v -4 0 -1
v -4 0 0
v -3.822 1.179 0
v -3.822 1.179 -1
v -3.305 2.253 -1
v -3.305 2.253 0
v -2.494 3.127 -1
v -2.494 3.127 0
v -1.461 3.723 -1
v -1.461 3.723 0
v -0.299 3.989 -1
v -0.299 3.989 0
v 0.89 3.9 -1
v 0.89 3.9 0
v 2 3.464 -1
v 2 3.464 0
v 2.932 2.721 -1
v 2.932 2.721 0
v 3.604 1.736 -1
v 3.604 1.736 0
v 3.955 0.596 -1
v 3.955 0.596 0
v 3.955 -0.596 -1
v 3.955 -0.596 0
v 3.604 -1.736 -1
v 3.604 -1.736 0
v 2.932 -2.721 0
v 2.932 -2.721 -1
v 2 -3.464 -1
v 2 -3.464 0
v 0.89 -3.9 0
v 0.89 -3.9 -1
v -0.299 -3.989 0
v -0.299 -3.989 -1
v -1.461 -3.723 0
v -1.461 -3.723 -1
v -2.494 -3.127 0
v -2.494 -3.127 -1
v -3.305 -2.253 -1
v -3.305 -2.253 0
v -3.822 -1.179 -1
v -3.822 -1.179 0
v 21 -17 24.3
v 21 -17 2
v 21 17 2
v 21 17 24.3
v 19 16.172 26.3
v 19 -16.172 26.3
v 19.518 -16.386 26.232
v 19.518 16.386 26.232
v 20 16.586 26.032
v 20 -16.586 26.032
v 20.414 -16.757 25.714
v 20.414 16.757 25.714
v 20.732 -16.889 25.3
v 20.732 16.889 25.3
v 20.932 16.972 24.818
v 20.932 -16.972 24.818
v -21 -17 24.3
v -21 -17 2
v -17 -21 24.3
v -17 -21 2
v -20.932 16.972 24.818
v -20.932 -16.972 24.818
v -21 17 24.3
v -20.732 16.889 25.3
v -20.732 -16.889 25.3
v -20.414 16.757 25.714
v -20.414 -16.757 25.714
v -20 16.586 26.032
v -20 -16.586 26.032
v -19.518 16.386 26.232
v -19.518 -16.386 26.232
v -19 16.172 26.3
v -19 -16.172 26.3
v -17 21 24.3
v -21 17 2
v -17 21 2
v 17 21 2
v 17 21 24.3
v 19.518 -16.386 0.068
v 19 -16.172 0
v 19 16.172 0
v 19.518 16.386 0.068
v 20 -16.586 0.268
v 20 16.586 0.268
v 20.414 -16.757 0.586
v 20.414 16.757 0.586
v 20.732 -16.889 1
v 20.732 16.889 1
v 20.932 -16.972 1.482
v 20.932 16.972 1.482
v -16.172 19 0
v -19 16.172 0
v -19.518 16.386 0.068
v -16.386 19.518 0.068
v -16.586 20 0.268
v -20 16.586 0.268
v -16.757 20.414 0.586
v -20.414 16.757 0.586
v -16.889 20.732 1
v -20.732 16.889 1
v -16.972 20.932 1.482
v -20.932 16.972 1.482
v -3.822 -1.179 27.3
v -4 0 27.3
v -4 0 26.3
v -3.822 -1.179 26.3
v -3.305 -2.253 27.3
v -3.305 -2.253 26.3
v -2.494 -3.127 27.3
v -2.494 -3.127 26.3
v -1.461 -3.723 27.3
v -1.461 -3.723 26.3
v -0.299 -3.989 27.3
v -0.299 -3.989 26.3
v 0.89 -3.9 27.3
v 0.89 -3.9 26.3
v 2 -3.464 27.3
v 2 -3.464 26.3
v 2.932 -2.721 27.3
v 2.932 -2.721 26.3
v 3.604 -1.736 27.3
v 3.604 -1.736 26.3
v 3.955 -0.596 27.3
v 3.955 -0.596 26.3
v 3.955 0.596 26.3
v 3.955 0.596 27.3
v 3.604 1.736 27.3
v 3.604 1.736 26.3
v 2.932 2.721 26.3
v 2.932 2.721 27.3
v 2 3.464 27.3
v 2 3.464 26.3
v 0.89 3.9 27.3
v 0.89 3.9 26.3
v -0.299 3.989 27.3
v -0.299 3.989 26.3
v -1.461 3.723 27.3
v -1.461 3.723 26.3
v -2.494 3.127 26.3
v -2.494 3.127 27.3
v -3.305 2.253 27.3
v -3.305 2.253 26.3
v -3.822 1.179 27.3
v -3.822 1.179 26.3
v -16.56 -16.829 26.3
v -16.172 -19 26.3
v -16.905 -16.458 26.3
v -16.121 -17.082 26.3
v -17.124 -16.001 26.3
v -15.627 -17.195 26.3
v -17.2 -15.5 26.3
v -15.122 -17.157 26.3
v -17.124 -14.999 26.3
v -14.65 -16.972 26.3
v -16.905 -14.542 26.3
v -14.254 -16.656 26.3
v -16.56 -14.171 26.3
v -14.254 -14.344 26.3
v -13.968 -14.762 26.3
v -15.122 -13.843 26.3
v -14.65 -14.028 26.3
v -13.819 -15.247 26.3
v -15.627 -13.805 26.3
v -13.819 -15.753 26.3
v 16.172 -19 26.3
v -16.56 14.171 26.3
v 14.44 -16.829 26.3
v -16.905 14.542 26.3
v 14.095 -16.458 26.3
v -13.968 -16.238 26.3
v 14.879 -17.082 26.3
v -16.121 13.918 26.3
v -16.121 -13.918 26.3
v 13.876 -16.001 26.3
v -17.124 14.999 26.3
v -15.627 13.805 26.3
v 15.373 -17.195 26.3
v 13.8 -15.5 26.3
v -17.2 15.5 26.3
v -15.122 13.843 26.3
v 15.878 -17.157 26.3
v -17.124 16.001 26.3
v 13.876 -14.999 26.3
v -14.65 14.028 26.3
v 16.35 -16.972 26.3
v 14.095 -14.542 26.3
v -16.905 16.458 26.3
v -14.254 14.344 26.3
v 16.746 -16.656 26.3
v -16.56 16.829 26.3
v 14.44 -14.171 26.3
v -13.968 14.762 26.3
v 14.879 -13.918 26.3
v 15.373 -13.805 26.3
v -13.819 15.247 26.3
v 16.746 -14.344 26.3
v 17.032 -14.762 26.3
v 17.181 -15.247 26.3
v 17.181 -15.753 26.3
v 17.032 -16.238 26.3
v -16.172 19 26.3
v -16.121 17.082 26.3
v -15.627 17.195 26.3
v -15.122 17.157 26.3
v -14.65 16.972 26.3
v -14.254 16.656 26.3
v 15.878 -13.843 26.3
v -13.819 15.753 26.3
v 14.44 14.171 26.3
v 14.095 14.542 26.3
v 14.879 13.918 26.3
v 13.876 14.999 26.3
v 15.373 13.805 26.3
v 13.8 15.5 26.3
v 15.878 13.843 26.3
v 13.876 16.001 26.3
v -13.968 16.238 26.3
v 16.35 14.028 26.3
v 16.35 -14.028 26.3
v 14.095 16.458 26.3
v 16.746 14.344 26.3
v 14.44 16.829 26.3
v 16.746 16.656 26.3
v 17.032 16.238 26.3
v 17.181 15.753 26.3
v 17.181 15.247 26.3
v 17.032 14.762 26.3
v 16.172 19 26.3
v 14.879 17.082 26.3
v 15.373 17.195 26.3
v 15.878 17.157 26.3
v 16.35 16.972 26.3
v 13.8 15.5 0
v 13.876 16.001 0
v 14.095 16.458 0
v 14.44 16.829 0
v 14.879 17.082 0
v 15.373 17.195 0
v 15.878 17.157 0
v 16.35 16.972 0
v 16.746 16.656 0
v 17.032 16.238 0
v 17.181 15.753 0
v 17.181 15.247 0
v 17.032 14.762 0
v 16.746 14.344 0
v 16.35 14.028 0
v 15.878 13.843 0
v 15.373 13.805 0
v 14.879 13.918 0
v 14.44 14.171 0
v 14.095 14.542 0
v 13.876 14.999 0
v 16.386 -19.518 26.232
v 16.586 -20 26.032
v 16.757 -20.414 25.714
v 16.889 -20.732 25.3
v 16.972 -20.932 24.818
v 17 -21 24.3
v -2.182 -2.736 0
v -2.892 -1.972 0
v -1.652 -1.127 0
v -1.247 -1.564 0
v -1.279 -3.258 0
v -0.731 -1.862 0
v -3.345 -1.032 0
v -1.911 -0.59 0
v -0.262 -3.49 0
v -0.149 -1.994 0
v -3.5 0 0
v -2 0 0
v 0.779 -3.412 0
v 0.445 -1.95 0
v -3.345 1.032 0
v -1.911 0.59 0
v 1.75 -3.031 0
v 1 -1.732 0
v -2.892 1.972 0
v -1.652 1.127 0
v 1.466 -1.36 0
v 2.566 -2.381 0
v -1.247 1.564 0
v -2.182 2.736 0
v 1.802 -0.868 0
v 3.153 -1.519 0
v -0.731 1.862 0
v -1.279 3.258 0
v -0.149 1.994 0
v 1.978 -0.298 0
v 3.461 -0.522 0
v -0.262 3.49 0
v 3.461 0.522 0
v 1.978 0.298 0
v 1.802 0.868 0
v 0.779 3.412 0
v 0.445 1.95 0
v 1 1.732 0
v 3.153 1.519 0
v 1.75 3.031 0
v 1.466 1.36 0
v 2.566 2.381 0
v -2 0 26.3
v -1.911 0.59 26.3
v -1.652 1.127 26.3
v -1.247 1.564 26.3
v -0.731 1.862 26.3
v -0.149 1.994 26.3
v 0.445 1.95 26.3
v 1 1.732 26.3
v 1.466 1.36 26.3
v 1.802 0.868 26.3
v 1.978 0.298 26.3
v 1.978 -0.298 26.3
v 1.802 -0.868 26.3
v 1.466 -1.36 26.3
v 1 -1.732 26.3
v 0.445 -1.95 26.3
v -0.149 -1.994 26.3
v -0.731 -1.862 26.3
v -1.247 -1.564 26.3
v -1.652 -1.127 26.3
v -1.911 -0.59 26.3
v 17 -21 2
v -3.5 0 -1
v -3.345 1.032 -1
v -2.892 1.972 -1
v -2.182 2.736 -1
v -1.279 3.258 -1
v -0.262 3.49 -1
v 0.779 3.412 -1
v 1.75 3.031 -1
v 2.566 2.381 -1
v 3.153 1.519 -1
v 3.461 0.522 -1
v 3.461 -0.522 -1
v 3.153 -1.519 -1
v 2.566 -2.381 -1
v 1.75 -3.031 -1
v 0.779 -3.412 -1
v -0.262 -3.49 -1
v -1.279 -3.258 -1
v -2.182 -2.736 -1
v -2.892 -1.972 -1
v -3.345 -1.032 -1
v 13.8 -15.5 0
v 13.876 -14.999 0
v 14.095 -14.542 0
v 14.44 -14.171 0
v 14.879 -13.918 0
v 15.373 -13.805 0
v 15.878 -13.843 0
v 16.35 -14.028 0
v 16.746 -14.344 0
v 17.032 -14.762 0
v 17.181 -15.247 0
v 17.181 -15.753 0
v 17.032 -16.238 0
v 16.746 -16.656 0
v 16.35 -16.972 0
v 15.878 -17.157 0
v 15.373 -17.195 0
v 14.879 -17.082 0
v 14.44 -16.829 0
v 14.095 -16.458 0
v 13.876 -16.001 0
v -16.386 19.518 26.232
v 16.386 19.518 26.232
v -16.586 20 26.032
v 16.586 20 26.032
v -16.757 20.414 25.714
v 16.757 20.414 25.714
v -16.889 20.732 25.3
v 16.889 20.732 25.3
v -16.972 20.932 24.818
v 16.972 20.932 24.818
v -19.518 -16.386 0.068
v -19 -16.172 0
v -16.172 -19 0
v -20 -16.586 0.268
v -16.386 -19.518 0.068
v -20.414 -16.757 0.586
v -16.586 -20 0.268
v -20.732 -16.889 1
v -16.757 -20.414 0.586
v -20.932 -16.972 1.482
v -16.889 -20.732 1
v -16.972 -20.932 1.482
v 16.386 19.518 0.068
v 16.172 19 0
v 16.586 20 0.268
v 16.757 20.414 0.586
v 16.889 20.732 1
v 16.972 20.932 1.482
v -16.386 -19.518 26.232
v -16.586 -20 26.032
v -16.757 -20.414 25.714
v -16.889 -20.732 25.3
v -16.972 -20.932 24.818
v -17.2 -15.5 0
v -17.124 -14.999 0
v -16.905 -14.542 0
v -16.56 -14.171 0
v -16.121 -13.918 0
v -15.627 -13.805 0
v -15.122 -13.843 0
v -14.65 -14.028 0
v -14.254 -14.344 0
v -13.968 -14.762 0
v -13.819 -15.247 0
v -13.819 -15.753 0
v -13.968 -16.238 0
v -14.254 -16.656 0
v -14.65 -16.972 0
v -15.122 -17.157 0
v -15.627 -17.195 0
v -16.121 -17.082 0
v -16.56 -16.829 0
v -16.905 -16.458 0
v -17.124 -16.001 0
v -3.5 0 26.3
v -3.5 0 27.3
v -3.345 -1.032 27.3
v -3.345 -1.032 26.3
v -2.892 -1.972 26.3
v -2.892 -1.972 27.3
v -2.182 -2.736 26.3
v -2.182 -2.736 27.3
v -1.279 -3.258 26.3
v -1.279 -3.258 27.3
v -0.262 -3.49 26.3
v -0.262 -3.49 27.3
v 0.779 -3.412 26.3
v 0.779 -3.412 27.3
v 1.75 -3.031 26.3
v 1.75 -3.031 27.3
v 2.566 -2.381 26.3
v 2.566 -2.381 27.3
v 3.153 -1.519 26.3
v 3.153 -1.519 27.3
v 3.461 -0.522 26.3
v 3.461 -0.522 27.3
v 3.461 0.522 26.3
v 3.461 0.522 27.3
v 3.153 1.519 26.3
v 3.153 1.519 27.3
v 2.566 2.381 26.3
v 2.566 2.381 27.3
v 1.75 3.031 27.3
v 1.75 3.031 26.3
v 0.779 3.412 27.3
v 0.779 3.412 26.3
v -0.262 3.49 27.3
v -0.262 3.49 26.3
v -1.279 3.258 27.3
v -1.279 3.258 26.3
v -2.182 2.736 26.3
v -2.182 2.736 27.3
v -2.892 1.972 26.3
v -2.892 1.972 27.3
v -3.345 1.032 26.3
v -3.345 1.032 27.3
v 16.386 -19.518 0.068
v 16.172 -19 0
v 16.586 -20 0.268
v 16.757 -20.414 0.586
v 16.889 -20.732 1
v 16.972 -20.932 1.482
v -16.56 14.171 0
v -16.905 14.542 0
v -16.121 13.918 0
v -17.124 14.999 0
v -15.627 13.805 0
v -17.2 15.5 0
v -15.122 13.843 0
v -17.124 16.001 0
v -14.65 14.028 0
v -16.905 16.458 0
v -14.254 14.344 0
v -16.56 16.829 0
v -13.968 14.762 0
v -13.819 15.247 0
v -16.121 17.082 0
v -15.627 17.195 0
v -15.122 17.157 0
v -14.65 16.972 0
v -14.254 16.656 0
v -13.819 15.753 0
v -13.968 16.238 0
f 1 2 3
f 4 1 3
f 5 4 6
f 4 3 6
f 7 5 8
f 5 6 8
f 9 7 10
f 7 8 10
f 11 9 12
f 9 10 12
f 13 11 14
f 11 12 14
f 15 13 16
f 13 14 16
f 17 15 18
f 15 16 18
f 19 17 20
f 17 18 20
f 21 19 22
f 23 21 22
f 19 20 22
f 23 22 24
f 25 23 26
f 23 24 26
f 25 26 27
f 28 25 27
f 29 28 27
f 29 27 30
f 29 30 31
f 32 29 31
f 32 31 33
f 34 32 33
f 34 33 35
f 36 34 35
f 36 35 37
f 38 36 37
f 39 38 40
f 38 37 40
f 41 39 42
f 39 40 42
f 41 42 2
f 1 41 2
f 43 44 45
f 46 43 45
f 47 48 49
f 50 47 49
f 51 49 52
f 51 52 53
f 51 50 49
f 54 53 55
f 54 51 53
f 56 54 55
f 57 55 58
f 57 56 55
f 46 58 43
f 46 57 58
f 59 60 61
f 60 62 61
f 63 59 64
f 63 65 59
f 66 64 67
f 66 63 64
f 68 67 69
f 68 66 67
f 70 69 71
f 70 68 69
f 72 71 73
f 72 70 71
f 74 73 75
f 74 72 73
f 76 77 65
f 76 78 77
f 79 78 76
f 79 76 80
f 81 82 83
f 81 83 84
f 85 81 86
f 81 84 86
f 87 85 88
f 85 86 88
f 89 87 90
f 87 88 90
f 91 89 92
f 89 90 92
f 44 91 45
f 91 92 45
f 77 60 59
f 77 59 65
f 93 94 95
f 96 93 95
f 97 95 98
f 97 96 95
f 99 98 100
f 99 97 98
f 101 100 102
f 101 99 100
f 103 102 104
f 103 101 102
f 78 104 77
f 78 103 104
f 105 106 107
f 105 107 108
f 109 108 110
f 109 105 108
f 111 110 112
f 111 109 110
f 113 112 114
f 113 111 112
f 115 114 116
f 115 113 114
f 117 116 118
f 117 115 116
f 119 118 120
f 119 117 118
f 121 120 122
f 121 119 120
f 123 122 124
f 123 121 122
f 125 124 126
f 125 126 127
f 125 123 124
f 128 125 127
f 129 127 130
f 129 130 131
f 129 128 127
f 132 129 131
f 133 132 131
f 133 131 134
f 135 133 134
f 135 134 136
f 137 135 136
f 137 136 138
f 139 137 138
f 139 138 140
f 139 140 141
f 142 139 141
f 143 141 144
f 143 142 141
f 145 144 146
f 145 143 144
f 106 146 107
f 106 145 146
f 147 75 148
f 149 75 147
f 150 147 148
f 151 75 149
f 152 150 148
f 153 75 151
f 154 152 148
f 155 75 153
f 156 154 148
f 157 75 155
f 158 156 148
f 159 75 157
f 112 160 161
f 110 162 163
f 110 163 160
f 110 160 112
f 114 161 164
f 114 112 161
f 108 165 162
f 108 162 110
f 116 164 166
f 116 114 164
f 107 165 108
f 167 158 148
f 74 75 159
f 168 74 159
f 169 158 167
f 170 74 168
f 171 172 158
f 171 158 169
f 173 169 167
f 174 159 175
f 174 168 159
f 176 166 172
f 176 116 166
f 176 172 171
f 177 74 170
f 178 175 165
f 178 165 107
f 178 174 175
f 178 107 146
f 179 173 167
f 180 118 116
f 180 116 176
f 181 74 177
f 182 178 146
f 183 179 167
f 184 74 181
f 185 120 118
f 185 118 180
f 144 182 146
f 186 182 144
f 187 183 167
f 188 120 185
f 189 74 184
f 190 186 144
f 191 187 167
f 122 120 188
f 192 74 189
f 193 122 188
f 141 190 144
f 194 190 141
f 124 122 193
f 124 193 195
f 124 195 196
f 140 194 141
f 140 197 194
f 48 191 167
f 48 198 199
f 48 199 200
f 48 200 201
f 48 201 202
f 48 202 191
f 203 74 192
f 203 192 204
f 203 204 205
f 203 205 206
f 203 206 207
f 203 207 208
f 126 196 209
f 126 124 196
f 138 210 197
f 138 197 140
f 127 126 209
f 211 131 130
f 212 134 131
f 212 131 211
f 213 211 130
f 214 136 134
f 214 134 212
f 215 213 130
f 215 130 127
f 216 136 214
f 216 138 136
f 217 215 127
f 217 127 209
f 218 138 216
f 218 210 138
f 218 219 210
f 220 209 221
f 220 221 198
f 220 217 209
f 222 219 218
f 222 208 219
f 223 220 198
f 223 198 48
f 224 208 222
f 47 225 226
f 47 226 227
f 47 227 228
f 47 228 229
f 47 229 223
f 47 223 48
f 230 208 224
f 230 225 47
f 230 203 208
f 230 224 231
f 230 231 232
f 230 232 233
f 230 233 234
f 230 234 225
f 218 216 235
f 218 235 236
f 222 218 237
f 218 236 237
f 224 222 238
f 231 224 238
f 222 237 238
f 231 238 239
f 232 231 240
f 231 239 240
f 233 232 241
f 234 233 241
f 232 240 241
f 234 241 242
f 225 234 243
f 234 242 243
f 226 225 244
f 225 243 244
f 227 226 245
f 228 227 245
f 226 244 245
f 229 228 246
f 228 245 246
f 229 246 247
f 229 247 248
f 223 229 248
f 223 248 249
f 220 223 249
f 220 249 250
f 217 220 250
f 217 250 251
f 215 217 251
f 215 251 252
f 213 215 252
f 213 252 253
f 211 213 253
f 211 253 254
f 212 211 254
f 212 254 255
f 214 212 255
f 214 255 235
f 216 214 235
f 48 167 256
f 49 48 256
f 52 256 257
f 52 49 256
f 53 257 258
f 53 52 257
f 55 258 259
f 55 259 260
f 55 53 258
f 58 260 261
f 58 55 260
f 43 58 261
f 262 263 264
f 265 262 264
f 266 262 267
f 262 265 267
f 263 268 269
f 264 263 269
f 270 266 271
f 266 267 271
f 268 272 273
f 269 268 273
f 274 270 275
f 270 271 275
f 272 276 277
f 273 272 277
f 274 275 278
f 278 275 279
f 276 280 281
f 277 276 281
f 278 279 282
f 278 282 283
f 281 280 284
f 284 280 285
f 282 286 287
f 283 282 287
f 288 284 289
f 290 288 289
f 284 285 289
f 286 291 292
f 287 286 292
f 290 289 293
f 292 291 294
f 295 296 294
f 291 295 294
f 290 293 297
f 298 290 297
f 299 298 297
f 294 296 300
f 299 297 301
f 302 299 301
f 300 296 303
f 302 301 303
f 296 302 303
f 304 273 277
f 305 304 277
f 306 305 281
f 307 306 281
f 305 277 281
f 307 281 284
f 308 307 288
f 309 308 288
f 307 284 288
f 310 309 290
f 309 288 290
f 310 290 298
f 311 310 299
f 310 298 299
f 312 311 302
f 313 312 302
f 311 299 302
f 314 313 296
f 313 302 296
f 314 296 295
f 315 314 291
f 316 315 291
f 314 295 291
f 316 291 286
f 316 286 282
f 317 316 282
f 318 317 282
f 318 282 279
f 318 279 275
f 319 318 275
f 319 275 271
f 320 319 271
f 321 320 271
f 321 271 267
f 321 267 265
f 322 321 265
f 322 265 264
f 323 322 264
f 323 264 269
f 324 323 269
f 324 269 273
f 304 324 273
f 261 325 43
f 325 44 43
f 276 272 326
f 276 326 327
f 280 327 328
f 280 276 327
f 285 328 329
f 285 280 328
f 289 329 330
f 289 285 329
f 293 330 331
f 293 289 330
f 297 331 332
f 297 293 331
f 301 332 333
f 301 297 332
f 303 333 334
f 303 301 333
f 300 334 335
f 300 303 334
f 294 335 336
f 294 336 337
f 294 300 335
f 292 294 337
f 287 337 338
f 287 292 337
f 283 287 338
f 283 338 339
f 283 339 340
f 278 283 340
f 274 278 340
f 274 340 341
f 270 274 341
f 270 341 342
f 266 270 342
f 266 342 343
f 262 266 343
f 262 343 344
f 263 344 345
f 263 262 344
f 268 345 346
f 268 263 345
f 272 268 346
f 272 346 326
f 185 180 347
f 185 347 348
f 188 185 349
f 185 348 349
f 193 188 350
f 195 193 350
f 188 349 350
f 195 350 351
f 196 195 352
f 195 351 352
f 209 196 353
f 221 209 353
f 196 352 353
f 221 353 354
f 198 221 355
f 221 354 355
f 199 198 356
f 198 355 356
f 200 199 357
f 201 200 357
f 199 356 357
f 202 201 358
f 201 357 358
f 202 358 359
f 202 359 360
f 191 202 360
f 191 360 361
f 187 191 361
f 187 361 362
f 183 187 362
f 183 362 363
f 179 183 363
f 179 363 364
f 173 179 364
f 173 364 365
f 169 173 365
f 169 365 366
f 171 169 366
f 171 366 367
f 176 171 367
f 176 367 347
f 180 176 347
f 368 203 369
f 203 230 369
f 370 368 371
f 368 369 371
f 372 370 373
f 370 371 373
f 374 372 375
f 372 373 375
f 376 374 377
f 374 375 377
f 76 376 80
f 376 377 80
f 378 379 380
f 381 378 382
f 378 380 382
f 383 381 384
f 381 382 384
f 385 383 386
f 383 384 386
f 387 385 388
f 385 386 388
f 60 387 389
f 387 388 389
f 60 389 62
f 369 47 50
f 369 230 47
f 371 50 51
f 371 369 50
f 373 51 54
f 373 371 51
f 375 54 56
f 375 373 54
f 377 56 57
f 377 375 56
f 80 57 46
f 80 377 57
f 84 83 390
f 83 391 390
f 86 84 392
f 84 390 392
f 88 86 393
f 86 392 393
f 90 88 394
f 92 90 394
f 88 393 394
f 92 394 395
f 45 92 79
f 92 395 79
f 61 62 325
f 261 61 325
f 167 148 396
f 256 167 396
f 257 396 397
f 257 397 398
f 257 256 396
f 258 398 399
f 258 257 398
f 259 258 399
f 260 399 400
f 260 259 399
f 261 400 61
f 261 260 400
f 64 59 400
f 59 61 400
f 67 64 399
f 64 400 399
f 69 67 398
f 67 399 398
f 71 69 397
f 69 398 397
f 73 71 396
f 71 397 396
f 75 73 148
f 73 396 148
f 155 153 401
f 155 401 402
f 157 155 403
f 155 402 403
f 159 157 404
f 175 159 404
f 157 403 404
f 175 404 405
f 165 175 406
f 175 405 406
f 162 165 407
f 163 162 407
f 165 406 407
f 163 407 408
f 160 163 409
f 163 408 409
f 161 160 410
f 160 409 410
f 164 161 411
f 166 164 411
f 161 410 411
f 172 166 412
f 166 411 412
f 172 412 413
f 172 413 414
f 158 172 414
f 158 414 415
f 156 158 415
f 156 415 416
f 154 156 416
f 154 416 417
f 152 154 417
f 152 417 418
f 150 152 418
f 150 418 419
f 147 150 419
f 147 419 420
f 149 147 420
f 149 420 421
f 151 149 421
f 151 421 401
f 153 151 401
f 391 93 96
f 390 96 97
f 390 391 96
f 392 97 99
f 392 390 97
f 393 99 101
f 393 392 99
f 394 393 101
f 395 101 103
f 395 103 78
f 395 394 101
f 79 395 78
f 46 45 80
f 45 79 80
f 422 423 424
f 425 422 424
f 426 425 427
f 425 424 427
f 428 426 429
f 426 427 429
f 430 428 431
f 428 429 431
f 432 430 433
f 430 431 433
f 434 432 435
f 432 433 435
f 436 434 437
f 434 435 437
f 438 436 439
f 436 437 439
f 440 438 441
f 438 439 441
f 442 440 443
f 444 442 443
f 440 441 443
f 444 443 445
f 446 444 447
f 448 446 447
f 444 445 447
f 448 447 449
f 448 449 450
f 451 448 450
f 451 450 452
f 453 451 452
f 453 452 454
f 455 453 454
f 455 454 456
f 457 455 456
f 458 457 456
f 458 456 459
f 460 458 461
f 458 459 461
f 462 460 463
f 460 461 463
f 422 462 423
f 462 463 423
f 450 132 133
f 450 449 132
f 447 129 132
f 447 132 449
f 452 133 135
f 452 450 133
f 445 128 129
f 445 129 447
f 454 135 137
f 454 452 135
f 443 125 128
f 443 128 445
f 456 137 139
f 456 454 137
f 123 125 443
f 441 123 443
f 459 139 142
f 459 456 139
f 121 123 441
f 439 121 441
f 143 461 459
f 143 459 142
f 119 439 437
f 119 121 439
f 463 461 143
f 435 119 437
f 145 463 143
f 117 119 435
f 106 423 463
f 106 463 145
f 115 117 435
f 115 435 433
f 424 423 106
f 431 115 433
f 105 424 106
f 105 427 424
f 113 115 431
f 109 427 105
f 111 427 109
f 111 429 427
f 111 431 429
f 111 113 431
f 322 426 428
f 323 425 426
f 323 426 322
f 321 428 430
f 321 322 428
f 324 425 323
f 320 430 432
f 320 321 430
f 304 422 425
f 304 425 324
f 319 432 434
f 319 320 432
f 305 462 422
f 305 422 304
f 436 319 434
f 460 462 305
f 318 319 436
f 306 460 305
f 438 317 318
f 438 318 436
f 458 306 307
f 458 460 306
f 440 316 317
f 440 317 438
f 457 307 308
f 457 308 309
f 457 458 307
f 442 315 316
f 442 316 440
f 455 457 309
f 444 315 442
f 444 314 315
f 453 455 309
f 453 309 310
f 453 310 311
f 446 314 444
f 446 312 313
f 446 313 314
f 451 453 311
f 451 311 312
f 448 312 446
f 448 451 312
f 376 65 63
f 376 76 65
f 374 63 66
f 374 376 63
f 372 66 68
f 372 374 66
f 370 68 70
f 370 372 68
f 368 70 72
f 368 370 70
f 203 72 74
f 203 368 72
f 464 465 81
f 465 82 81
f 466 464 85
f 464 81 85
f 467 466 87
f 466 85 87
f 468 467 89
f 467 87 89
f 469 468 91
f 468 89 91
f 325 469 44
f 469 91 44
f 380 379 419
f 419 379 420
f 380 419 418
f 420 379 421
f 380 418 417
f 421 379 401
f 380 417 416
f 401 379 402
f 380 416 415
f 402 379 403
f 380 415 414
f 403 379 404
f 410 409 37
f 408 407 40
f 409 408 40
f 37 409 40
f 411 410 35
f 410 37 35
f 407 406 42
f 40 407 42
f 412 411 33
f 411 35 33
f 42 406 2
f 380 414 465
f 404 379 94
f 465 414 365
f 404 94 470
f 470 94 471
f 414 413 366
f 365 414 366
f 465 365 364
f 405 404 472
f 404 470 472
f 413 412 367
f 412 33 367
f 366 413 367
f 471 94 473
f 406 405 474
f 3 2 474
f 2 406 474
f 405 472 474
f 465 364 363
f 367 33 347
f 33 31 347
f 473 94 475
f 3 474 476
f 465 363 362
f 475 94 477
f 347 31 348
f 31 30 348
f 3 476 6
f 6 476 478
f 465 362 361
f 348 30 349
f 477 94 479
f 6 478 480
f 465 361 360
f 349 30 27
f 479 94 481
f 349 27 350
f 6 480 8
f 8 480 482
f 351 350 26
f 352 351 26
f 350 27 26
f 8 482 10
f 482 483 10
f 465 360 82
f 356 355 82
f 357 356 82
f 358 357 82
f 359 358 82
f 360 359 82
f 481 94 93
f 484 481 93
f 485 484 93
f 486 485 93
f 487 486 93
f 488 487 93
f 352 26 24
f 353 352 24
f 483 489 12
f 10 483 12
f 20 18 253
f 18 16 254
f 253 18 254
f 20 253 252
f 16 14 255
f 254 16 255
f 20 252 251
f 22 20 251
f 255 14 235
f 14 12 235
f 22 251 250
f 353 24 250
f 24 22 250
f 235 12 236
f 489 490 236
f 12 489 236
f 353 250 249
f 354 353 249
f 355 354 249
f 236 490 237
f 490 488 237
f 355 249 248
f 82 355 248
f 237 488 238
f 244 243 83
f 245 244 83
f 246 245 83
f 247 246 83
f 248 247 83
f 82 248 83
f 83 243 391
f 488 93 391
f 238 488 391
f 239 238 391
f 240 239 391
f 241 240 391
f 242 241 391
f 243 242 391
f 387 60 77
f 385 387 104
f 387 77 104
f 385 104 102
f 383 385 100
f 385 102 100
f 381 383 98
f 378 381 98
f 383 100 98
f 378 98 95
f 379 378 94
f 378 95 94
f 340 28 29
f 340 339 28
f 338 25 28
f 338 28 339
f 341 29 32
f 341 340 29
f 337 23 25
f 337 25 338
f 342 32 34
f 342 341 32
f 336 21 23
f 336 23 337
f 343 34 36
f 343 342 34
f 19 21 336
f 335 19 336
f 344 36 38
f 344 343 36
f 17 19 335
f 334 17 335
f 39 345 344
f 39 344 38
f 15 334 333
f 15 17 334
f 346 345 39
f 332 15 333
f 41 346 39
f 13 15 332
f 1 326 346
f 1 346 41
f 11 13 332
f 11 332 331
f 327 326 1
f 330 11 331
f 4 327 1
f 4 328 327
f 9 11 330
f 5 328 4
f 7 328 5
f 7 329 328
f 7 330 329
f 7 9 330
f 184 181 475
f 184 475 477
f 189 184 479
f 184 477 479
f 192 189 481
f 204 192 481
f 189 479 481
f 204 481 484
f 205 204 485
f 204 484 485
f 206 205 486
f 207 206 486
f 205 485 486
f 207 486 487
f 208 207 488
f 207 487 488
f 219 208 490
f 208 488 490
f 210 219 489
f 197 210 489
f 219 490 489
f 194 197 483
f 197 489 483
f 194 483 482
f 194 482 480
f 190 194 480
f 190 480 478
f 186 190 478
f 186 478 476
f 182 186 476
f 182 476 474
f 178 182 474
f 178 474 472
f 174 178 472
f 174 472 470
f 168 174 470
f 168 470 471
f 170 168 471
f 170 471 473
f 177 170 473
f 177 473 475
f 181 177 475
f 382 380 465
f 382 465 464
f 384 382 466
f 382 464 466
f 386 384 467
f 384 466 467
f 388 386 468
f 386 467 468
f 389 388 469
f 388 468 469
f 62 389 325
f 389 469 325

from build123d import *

# Parameters (mm, degrees)
SKETCH_4_W                  = 42
SKETCH_4_H                  = 42
EXTRUDE_2_DEPTH             = 26.3
CHAMFER_1_SIZE              = 4
FILLET_1_R                  = 2
SKETCH_5_R                  = 2
CUT_EXTRUDE_1_DEPTH         = 40.669761784
SKETCH_6_R                  = 4
SKETCH_6_R_2                = 3.5
EXTRUDE_3_DEPTH             = 1
EXTRUDE_START               = 1
SKETCH_7_R                  = 4
SKETCH_7_R_2                = 3.5
EXTRUDE_4_DEPTH             = 1
HOLE_WIZARD_M31_D           = 3.4
PATTERN_LINEAR_1_COUNT      = 2
PATTERN_LINEAR_1_PITCH      = 31
PATTERN_LINEAR_1_COUNT_DIR2 = 2
PATTERN_LINEAR_1_PITCH_DIR2 = 31


with BuildPart() as part:
    # Эскиз4 → Бобышка-Вытянуть2 (new body)
    with BuildSketch(Plane.XY):
        Rectangle(SKETCH_4_W, SKETCH_4_H)
    extrude(amount=EXTRUDE_2_DEPTH)

    # Фаска1
    chamfer_1_edges = [part.edges().sort_by_distance(p)[0] for p in [
        (21, -21, 13.15),
        (-21, -21, 13.15),
        (-21, 21, 13.15),
        (21, 21, 13.15),
    ]]
    chamfer(chamfer_1_edges, length=CHAMFER_1_SIZE)

    # Скругление1
    fillet_1_edges = [part.edges().sort_by_distance(p)[0] for p in [
        (0, -21, 0),
        (0, -21, 26.3),
        (21, 0, 0),
        (-21, 0, 0),
        (0, 21, 0),
        (-19, 19, 0),
        (19, 19, 0),
        (19, -19, 0),
        (-19, -19, 0),
        (-21, 0, 26.3),
        (21, 0, 26.3),
        (0, 21, 26.3),
        (-19, 19, 26.3),
        (19, 19, 26.3),
        (19, -19, 26.3),
        (-19, -19, 26.3),
    ]]
    fillet(fillet_1_edges, radius=FILLET_1_R)

    # Эскиз5 → Вырез-Вытянуть1 (cut, through all)
    with BuildSketch(Plane(origin=(0, 0, 0), x_dir=(-1, 0, 0), z_dir=(0, 0, -1))):
        Circle(SKETCH_5_R)
    extrude(amount=-CUT_EXTRUDE_1_DEPTH, mode=Mode.SUBTRACT)

    # Эскиз6 → Бобышка-Вытянуть3 (add)
    with BuildSketch(Plane(origin=(0, 0, 0), x_dir=(-1, 0, 0), z_dir=(0, 0, -1))):
        Circle(SKETCH_6_R)
        Circle(SKETCH_6_R_2, mode=Mode.SUBTRACT)
    extrude(amount=EXTRUDE_3_DEPTH)

    # Эскиз7 → Бобышка-Вытянуть4 (add)
    with BuildSketch(Plane.XY.offset(26.3).offset(EXTRUDE_START)):
        with Locations(Location((0, 0, 0), (0, 0, 180))):
            Circle(SKETCH_7_R)
        with Locations(Location((0, 0, 0), (0, 0, 180))):
            Circle(SKETCH_7_R_2, mode=Mode.SUBTRACT)
    extrude(amount=-EXTRUDE_4_DEPTH)

    # Отверстие с зазором M31 (through all)
    with Locations(Plane.XY.offset(26.3)):
        with Locations((-15.5, 15.5)):
            hole_wizard_m31 = Hole(HOLE_WIZARD_M31_D / 2)

    # Линейный массив1: Hole Wizard M31 2 × 2
    with Locations(*[(i * PATTERN_LINEAR_1_PITCH, -j * PATTERN_LINEAR_1_PITCH_DIR2, 0) for i in range(PATTERN_LINEAR_1_COUNT) for j in range(PATTERN_LINEAR_1_COUNT_DIR2) if (i, j) != (0, 0)]):
        add(hole_wizard_m31, mode=Mode.SUBTRACT)


solid = part.part
